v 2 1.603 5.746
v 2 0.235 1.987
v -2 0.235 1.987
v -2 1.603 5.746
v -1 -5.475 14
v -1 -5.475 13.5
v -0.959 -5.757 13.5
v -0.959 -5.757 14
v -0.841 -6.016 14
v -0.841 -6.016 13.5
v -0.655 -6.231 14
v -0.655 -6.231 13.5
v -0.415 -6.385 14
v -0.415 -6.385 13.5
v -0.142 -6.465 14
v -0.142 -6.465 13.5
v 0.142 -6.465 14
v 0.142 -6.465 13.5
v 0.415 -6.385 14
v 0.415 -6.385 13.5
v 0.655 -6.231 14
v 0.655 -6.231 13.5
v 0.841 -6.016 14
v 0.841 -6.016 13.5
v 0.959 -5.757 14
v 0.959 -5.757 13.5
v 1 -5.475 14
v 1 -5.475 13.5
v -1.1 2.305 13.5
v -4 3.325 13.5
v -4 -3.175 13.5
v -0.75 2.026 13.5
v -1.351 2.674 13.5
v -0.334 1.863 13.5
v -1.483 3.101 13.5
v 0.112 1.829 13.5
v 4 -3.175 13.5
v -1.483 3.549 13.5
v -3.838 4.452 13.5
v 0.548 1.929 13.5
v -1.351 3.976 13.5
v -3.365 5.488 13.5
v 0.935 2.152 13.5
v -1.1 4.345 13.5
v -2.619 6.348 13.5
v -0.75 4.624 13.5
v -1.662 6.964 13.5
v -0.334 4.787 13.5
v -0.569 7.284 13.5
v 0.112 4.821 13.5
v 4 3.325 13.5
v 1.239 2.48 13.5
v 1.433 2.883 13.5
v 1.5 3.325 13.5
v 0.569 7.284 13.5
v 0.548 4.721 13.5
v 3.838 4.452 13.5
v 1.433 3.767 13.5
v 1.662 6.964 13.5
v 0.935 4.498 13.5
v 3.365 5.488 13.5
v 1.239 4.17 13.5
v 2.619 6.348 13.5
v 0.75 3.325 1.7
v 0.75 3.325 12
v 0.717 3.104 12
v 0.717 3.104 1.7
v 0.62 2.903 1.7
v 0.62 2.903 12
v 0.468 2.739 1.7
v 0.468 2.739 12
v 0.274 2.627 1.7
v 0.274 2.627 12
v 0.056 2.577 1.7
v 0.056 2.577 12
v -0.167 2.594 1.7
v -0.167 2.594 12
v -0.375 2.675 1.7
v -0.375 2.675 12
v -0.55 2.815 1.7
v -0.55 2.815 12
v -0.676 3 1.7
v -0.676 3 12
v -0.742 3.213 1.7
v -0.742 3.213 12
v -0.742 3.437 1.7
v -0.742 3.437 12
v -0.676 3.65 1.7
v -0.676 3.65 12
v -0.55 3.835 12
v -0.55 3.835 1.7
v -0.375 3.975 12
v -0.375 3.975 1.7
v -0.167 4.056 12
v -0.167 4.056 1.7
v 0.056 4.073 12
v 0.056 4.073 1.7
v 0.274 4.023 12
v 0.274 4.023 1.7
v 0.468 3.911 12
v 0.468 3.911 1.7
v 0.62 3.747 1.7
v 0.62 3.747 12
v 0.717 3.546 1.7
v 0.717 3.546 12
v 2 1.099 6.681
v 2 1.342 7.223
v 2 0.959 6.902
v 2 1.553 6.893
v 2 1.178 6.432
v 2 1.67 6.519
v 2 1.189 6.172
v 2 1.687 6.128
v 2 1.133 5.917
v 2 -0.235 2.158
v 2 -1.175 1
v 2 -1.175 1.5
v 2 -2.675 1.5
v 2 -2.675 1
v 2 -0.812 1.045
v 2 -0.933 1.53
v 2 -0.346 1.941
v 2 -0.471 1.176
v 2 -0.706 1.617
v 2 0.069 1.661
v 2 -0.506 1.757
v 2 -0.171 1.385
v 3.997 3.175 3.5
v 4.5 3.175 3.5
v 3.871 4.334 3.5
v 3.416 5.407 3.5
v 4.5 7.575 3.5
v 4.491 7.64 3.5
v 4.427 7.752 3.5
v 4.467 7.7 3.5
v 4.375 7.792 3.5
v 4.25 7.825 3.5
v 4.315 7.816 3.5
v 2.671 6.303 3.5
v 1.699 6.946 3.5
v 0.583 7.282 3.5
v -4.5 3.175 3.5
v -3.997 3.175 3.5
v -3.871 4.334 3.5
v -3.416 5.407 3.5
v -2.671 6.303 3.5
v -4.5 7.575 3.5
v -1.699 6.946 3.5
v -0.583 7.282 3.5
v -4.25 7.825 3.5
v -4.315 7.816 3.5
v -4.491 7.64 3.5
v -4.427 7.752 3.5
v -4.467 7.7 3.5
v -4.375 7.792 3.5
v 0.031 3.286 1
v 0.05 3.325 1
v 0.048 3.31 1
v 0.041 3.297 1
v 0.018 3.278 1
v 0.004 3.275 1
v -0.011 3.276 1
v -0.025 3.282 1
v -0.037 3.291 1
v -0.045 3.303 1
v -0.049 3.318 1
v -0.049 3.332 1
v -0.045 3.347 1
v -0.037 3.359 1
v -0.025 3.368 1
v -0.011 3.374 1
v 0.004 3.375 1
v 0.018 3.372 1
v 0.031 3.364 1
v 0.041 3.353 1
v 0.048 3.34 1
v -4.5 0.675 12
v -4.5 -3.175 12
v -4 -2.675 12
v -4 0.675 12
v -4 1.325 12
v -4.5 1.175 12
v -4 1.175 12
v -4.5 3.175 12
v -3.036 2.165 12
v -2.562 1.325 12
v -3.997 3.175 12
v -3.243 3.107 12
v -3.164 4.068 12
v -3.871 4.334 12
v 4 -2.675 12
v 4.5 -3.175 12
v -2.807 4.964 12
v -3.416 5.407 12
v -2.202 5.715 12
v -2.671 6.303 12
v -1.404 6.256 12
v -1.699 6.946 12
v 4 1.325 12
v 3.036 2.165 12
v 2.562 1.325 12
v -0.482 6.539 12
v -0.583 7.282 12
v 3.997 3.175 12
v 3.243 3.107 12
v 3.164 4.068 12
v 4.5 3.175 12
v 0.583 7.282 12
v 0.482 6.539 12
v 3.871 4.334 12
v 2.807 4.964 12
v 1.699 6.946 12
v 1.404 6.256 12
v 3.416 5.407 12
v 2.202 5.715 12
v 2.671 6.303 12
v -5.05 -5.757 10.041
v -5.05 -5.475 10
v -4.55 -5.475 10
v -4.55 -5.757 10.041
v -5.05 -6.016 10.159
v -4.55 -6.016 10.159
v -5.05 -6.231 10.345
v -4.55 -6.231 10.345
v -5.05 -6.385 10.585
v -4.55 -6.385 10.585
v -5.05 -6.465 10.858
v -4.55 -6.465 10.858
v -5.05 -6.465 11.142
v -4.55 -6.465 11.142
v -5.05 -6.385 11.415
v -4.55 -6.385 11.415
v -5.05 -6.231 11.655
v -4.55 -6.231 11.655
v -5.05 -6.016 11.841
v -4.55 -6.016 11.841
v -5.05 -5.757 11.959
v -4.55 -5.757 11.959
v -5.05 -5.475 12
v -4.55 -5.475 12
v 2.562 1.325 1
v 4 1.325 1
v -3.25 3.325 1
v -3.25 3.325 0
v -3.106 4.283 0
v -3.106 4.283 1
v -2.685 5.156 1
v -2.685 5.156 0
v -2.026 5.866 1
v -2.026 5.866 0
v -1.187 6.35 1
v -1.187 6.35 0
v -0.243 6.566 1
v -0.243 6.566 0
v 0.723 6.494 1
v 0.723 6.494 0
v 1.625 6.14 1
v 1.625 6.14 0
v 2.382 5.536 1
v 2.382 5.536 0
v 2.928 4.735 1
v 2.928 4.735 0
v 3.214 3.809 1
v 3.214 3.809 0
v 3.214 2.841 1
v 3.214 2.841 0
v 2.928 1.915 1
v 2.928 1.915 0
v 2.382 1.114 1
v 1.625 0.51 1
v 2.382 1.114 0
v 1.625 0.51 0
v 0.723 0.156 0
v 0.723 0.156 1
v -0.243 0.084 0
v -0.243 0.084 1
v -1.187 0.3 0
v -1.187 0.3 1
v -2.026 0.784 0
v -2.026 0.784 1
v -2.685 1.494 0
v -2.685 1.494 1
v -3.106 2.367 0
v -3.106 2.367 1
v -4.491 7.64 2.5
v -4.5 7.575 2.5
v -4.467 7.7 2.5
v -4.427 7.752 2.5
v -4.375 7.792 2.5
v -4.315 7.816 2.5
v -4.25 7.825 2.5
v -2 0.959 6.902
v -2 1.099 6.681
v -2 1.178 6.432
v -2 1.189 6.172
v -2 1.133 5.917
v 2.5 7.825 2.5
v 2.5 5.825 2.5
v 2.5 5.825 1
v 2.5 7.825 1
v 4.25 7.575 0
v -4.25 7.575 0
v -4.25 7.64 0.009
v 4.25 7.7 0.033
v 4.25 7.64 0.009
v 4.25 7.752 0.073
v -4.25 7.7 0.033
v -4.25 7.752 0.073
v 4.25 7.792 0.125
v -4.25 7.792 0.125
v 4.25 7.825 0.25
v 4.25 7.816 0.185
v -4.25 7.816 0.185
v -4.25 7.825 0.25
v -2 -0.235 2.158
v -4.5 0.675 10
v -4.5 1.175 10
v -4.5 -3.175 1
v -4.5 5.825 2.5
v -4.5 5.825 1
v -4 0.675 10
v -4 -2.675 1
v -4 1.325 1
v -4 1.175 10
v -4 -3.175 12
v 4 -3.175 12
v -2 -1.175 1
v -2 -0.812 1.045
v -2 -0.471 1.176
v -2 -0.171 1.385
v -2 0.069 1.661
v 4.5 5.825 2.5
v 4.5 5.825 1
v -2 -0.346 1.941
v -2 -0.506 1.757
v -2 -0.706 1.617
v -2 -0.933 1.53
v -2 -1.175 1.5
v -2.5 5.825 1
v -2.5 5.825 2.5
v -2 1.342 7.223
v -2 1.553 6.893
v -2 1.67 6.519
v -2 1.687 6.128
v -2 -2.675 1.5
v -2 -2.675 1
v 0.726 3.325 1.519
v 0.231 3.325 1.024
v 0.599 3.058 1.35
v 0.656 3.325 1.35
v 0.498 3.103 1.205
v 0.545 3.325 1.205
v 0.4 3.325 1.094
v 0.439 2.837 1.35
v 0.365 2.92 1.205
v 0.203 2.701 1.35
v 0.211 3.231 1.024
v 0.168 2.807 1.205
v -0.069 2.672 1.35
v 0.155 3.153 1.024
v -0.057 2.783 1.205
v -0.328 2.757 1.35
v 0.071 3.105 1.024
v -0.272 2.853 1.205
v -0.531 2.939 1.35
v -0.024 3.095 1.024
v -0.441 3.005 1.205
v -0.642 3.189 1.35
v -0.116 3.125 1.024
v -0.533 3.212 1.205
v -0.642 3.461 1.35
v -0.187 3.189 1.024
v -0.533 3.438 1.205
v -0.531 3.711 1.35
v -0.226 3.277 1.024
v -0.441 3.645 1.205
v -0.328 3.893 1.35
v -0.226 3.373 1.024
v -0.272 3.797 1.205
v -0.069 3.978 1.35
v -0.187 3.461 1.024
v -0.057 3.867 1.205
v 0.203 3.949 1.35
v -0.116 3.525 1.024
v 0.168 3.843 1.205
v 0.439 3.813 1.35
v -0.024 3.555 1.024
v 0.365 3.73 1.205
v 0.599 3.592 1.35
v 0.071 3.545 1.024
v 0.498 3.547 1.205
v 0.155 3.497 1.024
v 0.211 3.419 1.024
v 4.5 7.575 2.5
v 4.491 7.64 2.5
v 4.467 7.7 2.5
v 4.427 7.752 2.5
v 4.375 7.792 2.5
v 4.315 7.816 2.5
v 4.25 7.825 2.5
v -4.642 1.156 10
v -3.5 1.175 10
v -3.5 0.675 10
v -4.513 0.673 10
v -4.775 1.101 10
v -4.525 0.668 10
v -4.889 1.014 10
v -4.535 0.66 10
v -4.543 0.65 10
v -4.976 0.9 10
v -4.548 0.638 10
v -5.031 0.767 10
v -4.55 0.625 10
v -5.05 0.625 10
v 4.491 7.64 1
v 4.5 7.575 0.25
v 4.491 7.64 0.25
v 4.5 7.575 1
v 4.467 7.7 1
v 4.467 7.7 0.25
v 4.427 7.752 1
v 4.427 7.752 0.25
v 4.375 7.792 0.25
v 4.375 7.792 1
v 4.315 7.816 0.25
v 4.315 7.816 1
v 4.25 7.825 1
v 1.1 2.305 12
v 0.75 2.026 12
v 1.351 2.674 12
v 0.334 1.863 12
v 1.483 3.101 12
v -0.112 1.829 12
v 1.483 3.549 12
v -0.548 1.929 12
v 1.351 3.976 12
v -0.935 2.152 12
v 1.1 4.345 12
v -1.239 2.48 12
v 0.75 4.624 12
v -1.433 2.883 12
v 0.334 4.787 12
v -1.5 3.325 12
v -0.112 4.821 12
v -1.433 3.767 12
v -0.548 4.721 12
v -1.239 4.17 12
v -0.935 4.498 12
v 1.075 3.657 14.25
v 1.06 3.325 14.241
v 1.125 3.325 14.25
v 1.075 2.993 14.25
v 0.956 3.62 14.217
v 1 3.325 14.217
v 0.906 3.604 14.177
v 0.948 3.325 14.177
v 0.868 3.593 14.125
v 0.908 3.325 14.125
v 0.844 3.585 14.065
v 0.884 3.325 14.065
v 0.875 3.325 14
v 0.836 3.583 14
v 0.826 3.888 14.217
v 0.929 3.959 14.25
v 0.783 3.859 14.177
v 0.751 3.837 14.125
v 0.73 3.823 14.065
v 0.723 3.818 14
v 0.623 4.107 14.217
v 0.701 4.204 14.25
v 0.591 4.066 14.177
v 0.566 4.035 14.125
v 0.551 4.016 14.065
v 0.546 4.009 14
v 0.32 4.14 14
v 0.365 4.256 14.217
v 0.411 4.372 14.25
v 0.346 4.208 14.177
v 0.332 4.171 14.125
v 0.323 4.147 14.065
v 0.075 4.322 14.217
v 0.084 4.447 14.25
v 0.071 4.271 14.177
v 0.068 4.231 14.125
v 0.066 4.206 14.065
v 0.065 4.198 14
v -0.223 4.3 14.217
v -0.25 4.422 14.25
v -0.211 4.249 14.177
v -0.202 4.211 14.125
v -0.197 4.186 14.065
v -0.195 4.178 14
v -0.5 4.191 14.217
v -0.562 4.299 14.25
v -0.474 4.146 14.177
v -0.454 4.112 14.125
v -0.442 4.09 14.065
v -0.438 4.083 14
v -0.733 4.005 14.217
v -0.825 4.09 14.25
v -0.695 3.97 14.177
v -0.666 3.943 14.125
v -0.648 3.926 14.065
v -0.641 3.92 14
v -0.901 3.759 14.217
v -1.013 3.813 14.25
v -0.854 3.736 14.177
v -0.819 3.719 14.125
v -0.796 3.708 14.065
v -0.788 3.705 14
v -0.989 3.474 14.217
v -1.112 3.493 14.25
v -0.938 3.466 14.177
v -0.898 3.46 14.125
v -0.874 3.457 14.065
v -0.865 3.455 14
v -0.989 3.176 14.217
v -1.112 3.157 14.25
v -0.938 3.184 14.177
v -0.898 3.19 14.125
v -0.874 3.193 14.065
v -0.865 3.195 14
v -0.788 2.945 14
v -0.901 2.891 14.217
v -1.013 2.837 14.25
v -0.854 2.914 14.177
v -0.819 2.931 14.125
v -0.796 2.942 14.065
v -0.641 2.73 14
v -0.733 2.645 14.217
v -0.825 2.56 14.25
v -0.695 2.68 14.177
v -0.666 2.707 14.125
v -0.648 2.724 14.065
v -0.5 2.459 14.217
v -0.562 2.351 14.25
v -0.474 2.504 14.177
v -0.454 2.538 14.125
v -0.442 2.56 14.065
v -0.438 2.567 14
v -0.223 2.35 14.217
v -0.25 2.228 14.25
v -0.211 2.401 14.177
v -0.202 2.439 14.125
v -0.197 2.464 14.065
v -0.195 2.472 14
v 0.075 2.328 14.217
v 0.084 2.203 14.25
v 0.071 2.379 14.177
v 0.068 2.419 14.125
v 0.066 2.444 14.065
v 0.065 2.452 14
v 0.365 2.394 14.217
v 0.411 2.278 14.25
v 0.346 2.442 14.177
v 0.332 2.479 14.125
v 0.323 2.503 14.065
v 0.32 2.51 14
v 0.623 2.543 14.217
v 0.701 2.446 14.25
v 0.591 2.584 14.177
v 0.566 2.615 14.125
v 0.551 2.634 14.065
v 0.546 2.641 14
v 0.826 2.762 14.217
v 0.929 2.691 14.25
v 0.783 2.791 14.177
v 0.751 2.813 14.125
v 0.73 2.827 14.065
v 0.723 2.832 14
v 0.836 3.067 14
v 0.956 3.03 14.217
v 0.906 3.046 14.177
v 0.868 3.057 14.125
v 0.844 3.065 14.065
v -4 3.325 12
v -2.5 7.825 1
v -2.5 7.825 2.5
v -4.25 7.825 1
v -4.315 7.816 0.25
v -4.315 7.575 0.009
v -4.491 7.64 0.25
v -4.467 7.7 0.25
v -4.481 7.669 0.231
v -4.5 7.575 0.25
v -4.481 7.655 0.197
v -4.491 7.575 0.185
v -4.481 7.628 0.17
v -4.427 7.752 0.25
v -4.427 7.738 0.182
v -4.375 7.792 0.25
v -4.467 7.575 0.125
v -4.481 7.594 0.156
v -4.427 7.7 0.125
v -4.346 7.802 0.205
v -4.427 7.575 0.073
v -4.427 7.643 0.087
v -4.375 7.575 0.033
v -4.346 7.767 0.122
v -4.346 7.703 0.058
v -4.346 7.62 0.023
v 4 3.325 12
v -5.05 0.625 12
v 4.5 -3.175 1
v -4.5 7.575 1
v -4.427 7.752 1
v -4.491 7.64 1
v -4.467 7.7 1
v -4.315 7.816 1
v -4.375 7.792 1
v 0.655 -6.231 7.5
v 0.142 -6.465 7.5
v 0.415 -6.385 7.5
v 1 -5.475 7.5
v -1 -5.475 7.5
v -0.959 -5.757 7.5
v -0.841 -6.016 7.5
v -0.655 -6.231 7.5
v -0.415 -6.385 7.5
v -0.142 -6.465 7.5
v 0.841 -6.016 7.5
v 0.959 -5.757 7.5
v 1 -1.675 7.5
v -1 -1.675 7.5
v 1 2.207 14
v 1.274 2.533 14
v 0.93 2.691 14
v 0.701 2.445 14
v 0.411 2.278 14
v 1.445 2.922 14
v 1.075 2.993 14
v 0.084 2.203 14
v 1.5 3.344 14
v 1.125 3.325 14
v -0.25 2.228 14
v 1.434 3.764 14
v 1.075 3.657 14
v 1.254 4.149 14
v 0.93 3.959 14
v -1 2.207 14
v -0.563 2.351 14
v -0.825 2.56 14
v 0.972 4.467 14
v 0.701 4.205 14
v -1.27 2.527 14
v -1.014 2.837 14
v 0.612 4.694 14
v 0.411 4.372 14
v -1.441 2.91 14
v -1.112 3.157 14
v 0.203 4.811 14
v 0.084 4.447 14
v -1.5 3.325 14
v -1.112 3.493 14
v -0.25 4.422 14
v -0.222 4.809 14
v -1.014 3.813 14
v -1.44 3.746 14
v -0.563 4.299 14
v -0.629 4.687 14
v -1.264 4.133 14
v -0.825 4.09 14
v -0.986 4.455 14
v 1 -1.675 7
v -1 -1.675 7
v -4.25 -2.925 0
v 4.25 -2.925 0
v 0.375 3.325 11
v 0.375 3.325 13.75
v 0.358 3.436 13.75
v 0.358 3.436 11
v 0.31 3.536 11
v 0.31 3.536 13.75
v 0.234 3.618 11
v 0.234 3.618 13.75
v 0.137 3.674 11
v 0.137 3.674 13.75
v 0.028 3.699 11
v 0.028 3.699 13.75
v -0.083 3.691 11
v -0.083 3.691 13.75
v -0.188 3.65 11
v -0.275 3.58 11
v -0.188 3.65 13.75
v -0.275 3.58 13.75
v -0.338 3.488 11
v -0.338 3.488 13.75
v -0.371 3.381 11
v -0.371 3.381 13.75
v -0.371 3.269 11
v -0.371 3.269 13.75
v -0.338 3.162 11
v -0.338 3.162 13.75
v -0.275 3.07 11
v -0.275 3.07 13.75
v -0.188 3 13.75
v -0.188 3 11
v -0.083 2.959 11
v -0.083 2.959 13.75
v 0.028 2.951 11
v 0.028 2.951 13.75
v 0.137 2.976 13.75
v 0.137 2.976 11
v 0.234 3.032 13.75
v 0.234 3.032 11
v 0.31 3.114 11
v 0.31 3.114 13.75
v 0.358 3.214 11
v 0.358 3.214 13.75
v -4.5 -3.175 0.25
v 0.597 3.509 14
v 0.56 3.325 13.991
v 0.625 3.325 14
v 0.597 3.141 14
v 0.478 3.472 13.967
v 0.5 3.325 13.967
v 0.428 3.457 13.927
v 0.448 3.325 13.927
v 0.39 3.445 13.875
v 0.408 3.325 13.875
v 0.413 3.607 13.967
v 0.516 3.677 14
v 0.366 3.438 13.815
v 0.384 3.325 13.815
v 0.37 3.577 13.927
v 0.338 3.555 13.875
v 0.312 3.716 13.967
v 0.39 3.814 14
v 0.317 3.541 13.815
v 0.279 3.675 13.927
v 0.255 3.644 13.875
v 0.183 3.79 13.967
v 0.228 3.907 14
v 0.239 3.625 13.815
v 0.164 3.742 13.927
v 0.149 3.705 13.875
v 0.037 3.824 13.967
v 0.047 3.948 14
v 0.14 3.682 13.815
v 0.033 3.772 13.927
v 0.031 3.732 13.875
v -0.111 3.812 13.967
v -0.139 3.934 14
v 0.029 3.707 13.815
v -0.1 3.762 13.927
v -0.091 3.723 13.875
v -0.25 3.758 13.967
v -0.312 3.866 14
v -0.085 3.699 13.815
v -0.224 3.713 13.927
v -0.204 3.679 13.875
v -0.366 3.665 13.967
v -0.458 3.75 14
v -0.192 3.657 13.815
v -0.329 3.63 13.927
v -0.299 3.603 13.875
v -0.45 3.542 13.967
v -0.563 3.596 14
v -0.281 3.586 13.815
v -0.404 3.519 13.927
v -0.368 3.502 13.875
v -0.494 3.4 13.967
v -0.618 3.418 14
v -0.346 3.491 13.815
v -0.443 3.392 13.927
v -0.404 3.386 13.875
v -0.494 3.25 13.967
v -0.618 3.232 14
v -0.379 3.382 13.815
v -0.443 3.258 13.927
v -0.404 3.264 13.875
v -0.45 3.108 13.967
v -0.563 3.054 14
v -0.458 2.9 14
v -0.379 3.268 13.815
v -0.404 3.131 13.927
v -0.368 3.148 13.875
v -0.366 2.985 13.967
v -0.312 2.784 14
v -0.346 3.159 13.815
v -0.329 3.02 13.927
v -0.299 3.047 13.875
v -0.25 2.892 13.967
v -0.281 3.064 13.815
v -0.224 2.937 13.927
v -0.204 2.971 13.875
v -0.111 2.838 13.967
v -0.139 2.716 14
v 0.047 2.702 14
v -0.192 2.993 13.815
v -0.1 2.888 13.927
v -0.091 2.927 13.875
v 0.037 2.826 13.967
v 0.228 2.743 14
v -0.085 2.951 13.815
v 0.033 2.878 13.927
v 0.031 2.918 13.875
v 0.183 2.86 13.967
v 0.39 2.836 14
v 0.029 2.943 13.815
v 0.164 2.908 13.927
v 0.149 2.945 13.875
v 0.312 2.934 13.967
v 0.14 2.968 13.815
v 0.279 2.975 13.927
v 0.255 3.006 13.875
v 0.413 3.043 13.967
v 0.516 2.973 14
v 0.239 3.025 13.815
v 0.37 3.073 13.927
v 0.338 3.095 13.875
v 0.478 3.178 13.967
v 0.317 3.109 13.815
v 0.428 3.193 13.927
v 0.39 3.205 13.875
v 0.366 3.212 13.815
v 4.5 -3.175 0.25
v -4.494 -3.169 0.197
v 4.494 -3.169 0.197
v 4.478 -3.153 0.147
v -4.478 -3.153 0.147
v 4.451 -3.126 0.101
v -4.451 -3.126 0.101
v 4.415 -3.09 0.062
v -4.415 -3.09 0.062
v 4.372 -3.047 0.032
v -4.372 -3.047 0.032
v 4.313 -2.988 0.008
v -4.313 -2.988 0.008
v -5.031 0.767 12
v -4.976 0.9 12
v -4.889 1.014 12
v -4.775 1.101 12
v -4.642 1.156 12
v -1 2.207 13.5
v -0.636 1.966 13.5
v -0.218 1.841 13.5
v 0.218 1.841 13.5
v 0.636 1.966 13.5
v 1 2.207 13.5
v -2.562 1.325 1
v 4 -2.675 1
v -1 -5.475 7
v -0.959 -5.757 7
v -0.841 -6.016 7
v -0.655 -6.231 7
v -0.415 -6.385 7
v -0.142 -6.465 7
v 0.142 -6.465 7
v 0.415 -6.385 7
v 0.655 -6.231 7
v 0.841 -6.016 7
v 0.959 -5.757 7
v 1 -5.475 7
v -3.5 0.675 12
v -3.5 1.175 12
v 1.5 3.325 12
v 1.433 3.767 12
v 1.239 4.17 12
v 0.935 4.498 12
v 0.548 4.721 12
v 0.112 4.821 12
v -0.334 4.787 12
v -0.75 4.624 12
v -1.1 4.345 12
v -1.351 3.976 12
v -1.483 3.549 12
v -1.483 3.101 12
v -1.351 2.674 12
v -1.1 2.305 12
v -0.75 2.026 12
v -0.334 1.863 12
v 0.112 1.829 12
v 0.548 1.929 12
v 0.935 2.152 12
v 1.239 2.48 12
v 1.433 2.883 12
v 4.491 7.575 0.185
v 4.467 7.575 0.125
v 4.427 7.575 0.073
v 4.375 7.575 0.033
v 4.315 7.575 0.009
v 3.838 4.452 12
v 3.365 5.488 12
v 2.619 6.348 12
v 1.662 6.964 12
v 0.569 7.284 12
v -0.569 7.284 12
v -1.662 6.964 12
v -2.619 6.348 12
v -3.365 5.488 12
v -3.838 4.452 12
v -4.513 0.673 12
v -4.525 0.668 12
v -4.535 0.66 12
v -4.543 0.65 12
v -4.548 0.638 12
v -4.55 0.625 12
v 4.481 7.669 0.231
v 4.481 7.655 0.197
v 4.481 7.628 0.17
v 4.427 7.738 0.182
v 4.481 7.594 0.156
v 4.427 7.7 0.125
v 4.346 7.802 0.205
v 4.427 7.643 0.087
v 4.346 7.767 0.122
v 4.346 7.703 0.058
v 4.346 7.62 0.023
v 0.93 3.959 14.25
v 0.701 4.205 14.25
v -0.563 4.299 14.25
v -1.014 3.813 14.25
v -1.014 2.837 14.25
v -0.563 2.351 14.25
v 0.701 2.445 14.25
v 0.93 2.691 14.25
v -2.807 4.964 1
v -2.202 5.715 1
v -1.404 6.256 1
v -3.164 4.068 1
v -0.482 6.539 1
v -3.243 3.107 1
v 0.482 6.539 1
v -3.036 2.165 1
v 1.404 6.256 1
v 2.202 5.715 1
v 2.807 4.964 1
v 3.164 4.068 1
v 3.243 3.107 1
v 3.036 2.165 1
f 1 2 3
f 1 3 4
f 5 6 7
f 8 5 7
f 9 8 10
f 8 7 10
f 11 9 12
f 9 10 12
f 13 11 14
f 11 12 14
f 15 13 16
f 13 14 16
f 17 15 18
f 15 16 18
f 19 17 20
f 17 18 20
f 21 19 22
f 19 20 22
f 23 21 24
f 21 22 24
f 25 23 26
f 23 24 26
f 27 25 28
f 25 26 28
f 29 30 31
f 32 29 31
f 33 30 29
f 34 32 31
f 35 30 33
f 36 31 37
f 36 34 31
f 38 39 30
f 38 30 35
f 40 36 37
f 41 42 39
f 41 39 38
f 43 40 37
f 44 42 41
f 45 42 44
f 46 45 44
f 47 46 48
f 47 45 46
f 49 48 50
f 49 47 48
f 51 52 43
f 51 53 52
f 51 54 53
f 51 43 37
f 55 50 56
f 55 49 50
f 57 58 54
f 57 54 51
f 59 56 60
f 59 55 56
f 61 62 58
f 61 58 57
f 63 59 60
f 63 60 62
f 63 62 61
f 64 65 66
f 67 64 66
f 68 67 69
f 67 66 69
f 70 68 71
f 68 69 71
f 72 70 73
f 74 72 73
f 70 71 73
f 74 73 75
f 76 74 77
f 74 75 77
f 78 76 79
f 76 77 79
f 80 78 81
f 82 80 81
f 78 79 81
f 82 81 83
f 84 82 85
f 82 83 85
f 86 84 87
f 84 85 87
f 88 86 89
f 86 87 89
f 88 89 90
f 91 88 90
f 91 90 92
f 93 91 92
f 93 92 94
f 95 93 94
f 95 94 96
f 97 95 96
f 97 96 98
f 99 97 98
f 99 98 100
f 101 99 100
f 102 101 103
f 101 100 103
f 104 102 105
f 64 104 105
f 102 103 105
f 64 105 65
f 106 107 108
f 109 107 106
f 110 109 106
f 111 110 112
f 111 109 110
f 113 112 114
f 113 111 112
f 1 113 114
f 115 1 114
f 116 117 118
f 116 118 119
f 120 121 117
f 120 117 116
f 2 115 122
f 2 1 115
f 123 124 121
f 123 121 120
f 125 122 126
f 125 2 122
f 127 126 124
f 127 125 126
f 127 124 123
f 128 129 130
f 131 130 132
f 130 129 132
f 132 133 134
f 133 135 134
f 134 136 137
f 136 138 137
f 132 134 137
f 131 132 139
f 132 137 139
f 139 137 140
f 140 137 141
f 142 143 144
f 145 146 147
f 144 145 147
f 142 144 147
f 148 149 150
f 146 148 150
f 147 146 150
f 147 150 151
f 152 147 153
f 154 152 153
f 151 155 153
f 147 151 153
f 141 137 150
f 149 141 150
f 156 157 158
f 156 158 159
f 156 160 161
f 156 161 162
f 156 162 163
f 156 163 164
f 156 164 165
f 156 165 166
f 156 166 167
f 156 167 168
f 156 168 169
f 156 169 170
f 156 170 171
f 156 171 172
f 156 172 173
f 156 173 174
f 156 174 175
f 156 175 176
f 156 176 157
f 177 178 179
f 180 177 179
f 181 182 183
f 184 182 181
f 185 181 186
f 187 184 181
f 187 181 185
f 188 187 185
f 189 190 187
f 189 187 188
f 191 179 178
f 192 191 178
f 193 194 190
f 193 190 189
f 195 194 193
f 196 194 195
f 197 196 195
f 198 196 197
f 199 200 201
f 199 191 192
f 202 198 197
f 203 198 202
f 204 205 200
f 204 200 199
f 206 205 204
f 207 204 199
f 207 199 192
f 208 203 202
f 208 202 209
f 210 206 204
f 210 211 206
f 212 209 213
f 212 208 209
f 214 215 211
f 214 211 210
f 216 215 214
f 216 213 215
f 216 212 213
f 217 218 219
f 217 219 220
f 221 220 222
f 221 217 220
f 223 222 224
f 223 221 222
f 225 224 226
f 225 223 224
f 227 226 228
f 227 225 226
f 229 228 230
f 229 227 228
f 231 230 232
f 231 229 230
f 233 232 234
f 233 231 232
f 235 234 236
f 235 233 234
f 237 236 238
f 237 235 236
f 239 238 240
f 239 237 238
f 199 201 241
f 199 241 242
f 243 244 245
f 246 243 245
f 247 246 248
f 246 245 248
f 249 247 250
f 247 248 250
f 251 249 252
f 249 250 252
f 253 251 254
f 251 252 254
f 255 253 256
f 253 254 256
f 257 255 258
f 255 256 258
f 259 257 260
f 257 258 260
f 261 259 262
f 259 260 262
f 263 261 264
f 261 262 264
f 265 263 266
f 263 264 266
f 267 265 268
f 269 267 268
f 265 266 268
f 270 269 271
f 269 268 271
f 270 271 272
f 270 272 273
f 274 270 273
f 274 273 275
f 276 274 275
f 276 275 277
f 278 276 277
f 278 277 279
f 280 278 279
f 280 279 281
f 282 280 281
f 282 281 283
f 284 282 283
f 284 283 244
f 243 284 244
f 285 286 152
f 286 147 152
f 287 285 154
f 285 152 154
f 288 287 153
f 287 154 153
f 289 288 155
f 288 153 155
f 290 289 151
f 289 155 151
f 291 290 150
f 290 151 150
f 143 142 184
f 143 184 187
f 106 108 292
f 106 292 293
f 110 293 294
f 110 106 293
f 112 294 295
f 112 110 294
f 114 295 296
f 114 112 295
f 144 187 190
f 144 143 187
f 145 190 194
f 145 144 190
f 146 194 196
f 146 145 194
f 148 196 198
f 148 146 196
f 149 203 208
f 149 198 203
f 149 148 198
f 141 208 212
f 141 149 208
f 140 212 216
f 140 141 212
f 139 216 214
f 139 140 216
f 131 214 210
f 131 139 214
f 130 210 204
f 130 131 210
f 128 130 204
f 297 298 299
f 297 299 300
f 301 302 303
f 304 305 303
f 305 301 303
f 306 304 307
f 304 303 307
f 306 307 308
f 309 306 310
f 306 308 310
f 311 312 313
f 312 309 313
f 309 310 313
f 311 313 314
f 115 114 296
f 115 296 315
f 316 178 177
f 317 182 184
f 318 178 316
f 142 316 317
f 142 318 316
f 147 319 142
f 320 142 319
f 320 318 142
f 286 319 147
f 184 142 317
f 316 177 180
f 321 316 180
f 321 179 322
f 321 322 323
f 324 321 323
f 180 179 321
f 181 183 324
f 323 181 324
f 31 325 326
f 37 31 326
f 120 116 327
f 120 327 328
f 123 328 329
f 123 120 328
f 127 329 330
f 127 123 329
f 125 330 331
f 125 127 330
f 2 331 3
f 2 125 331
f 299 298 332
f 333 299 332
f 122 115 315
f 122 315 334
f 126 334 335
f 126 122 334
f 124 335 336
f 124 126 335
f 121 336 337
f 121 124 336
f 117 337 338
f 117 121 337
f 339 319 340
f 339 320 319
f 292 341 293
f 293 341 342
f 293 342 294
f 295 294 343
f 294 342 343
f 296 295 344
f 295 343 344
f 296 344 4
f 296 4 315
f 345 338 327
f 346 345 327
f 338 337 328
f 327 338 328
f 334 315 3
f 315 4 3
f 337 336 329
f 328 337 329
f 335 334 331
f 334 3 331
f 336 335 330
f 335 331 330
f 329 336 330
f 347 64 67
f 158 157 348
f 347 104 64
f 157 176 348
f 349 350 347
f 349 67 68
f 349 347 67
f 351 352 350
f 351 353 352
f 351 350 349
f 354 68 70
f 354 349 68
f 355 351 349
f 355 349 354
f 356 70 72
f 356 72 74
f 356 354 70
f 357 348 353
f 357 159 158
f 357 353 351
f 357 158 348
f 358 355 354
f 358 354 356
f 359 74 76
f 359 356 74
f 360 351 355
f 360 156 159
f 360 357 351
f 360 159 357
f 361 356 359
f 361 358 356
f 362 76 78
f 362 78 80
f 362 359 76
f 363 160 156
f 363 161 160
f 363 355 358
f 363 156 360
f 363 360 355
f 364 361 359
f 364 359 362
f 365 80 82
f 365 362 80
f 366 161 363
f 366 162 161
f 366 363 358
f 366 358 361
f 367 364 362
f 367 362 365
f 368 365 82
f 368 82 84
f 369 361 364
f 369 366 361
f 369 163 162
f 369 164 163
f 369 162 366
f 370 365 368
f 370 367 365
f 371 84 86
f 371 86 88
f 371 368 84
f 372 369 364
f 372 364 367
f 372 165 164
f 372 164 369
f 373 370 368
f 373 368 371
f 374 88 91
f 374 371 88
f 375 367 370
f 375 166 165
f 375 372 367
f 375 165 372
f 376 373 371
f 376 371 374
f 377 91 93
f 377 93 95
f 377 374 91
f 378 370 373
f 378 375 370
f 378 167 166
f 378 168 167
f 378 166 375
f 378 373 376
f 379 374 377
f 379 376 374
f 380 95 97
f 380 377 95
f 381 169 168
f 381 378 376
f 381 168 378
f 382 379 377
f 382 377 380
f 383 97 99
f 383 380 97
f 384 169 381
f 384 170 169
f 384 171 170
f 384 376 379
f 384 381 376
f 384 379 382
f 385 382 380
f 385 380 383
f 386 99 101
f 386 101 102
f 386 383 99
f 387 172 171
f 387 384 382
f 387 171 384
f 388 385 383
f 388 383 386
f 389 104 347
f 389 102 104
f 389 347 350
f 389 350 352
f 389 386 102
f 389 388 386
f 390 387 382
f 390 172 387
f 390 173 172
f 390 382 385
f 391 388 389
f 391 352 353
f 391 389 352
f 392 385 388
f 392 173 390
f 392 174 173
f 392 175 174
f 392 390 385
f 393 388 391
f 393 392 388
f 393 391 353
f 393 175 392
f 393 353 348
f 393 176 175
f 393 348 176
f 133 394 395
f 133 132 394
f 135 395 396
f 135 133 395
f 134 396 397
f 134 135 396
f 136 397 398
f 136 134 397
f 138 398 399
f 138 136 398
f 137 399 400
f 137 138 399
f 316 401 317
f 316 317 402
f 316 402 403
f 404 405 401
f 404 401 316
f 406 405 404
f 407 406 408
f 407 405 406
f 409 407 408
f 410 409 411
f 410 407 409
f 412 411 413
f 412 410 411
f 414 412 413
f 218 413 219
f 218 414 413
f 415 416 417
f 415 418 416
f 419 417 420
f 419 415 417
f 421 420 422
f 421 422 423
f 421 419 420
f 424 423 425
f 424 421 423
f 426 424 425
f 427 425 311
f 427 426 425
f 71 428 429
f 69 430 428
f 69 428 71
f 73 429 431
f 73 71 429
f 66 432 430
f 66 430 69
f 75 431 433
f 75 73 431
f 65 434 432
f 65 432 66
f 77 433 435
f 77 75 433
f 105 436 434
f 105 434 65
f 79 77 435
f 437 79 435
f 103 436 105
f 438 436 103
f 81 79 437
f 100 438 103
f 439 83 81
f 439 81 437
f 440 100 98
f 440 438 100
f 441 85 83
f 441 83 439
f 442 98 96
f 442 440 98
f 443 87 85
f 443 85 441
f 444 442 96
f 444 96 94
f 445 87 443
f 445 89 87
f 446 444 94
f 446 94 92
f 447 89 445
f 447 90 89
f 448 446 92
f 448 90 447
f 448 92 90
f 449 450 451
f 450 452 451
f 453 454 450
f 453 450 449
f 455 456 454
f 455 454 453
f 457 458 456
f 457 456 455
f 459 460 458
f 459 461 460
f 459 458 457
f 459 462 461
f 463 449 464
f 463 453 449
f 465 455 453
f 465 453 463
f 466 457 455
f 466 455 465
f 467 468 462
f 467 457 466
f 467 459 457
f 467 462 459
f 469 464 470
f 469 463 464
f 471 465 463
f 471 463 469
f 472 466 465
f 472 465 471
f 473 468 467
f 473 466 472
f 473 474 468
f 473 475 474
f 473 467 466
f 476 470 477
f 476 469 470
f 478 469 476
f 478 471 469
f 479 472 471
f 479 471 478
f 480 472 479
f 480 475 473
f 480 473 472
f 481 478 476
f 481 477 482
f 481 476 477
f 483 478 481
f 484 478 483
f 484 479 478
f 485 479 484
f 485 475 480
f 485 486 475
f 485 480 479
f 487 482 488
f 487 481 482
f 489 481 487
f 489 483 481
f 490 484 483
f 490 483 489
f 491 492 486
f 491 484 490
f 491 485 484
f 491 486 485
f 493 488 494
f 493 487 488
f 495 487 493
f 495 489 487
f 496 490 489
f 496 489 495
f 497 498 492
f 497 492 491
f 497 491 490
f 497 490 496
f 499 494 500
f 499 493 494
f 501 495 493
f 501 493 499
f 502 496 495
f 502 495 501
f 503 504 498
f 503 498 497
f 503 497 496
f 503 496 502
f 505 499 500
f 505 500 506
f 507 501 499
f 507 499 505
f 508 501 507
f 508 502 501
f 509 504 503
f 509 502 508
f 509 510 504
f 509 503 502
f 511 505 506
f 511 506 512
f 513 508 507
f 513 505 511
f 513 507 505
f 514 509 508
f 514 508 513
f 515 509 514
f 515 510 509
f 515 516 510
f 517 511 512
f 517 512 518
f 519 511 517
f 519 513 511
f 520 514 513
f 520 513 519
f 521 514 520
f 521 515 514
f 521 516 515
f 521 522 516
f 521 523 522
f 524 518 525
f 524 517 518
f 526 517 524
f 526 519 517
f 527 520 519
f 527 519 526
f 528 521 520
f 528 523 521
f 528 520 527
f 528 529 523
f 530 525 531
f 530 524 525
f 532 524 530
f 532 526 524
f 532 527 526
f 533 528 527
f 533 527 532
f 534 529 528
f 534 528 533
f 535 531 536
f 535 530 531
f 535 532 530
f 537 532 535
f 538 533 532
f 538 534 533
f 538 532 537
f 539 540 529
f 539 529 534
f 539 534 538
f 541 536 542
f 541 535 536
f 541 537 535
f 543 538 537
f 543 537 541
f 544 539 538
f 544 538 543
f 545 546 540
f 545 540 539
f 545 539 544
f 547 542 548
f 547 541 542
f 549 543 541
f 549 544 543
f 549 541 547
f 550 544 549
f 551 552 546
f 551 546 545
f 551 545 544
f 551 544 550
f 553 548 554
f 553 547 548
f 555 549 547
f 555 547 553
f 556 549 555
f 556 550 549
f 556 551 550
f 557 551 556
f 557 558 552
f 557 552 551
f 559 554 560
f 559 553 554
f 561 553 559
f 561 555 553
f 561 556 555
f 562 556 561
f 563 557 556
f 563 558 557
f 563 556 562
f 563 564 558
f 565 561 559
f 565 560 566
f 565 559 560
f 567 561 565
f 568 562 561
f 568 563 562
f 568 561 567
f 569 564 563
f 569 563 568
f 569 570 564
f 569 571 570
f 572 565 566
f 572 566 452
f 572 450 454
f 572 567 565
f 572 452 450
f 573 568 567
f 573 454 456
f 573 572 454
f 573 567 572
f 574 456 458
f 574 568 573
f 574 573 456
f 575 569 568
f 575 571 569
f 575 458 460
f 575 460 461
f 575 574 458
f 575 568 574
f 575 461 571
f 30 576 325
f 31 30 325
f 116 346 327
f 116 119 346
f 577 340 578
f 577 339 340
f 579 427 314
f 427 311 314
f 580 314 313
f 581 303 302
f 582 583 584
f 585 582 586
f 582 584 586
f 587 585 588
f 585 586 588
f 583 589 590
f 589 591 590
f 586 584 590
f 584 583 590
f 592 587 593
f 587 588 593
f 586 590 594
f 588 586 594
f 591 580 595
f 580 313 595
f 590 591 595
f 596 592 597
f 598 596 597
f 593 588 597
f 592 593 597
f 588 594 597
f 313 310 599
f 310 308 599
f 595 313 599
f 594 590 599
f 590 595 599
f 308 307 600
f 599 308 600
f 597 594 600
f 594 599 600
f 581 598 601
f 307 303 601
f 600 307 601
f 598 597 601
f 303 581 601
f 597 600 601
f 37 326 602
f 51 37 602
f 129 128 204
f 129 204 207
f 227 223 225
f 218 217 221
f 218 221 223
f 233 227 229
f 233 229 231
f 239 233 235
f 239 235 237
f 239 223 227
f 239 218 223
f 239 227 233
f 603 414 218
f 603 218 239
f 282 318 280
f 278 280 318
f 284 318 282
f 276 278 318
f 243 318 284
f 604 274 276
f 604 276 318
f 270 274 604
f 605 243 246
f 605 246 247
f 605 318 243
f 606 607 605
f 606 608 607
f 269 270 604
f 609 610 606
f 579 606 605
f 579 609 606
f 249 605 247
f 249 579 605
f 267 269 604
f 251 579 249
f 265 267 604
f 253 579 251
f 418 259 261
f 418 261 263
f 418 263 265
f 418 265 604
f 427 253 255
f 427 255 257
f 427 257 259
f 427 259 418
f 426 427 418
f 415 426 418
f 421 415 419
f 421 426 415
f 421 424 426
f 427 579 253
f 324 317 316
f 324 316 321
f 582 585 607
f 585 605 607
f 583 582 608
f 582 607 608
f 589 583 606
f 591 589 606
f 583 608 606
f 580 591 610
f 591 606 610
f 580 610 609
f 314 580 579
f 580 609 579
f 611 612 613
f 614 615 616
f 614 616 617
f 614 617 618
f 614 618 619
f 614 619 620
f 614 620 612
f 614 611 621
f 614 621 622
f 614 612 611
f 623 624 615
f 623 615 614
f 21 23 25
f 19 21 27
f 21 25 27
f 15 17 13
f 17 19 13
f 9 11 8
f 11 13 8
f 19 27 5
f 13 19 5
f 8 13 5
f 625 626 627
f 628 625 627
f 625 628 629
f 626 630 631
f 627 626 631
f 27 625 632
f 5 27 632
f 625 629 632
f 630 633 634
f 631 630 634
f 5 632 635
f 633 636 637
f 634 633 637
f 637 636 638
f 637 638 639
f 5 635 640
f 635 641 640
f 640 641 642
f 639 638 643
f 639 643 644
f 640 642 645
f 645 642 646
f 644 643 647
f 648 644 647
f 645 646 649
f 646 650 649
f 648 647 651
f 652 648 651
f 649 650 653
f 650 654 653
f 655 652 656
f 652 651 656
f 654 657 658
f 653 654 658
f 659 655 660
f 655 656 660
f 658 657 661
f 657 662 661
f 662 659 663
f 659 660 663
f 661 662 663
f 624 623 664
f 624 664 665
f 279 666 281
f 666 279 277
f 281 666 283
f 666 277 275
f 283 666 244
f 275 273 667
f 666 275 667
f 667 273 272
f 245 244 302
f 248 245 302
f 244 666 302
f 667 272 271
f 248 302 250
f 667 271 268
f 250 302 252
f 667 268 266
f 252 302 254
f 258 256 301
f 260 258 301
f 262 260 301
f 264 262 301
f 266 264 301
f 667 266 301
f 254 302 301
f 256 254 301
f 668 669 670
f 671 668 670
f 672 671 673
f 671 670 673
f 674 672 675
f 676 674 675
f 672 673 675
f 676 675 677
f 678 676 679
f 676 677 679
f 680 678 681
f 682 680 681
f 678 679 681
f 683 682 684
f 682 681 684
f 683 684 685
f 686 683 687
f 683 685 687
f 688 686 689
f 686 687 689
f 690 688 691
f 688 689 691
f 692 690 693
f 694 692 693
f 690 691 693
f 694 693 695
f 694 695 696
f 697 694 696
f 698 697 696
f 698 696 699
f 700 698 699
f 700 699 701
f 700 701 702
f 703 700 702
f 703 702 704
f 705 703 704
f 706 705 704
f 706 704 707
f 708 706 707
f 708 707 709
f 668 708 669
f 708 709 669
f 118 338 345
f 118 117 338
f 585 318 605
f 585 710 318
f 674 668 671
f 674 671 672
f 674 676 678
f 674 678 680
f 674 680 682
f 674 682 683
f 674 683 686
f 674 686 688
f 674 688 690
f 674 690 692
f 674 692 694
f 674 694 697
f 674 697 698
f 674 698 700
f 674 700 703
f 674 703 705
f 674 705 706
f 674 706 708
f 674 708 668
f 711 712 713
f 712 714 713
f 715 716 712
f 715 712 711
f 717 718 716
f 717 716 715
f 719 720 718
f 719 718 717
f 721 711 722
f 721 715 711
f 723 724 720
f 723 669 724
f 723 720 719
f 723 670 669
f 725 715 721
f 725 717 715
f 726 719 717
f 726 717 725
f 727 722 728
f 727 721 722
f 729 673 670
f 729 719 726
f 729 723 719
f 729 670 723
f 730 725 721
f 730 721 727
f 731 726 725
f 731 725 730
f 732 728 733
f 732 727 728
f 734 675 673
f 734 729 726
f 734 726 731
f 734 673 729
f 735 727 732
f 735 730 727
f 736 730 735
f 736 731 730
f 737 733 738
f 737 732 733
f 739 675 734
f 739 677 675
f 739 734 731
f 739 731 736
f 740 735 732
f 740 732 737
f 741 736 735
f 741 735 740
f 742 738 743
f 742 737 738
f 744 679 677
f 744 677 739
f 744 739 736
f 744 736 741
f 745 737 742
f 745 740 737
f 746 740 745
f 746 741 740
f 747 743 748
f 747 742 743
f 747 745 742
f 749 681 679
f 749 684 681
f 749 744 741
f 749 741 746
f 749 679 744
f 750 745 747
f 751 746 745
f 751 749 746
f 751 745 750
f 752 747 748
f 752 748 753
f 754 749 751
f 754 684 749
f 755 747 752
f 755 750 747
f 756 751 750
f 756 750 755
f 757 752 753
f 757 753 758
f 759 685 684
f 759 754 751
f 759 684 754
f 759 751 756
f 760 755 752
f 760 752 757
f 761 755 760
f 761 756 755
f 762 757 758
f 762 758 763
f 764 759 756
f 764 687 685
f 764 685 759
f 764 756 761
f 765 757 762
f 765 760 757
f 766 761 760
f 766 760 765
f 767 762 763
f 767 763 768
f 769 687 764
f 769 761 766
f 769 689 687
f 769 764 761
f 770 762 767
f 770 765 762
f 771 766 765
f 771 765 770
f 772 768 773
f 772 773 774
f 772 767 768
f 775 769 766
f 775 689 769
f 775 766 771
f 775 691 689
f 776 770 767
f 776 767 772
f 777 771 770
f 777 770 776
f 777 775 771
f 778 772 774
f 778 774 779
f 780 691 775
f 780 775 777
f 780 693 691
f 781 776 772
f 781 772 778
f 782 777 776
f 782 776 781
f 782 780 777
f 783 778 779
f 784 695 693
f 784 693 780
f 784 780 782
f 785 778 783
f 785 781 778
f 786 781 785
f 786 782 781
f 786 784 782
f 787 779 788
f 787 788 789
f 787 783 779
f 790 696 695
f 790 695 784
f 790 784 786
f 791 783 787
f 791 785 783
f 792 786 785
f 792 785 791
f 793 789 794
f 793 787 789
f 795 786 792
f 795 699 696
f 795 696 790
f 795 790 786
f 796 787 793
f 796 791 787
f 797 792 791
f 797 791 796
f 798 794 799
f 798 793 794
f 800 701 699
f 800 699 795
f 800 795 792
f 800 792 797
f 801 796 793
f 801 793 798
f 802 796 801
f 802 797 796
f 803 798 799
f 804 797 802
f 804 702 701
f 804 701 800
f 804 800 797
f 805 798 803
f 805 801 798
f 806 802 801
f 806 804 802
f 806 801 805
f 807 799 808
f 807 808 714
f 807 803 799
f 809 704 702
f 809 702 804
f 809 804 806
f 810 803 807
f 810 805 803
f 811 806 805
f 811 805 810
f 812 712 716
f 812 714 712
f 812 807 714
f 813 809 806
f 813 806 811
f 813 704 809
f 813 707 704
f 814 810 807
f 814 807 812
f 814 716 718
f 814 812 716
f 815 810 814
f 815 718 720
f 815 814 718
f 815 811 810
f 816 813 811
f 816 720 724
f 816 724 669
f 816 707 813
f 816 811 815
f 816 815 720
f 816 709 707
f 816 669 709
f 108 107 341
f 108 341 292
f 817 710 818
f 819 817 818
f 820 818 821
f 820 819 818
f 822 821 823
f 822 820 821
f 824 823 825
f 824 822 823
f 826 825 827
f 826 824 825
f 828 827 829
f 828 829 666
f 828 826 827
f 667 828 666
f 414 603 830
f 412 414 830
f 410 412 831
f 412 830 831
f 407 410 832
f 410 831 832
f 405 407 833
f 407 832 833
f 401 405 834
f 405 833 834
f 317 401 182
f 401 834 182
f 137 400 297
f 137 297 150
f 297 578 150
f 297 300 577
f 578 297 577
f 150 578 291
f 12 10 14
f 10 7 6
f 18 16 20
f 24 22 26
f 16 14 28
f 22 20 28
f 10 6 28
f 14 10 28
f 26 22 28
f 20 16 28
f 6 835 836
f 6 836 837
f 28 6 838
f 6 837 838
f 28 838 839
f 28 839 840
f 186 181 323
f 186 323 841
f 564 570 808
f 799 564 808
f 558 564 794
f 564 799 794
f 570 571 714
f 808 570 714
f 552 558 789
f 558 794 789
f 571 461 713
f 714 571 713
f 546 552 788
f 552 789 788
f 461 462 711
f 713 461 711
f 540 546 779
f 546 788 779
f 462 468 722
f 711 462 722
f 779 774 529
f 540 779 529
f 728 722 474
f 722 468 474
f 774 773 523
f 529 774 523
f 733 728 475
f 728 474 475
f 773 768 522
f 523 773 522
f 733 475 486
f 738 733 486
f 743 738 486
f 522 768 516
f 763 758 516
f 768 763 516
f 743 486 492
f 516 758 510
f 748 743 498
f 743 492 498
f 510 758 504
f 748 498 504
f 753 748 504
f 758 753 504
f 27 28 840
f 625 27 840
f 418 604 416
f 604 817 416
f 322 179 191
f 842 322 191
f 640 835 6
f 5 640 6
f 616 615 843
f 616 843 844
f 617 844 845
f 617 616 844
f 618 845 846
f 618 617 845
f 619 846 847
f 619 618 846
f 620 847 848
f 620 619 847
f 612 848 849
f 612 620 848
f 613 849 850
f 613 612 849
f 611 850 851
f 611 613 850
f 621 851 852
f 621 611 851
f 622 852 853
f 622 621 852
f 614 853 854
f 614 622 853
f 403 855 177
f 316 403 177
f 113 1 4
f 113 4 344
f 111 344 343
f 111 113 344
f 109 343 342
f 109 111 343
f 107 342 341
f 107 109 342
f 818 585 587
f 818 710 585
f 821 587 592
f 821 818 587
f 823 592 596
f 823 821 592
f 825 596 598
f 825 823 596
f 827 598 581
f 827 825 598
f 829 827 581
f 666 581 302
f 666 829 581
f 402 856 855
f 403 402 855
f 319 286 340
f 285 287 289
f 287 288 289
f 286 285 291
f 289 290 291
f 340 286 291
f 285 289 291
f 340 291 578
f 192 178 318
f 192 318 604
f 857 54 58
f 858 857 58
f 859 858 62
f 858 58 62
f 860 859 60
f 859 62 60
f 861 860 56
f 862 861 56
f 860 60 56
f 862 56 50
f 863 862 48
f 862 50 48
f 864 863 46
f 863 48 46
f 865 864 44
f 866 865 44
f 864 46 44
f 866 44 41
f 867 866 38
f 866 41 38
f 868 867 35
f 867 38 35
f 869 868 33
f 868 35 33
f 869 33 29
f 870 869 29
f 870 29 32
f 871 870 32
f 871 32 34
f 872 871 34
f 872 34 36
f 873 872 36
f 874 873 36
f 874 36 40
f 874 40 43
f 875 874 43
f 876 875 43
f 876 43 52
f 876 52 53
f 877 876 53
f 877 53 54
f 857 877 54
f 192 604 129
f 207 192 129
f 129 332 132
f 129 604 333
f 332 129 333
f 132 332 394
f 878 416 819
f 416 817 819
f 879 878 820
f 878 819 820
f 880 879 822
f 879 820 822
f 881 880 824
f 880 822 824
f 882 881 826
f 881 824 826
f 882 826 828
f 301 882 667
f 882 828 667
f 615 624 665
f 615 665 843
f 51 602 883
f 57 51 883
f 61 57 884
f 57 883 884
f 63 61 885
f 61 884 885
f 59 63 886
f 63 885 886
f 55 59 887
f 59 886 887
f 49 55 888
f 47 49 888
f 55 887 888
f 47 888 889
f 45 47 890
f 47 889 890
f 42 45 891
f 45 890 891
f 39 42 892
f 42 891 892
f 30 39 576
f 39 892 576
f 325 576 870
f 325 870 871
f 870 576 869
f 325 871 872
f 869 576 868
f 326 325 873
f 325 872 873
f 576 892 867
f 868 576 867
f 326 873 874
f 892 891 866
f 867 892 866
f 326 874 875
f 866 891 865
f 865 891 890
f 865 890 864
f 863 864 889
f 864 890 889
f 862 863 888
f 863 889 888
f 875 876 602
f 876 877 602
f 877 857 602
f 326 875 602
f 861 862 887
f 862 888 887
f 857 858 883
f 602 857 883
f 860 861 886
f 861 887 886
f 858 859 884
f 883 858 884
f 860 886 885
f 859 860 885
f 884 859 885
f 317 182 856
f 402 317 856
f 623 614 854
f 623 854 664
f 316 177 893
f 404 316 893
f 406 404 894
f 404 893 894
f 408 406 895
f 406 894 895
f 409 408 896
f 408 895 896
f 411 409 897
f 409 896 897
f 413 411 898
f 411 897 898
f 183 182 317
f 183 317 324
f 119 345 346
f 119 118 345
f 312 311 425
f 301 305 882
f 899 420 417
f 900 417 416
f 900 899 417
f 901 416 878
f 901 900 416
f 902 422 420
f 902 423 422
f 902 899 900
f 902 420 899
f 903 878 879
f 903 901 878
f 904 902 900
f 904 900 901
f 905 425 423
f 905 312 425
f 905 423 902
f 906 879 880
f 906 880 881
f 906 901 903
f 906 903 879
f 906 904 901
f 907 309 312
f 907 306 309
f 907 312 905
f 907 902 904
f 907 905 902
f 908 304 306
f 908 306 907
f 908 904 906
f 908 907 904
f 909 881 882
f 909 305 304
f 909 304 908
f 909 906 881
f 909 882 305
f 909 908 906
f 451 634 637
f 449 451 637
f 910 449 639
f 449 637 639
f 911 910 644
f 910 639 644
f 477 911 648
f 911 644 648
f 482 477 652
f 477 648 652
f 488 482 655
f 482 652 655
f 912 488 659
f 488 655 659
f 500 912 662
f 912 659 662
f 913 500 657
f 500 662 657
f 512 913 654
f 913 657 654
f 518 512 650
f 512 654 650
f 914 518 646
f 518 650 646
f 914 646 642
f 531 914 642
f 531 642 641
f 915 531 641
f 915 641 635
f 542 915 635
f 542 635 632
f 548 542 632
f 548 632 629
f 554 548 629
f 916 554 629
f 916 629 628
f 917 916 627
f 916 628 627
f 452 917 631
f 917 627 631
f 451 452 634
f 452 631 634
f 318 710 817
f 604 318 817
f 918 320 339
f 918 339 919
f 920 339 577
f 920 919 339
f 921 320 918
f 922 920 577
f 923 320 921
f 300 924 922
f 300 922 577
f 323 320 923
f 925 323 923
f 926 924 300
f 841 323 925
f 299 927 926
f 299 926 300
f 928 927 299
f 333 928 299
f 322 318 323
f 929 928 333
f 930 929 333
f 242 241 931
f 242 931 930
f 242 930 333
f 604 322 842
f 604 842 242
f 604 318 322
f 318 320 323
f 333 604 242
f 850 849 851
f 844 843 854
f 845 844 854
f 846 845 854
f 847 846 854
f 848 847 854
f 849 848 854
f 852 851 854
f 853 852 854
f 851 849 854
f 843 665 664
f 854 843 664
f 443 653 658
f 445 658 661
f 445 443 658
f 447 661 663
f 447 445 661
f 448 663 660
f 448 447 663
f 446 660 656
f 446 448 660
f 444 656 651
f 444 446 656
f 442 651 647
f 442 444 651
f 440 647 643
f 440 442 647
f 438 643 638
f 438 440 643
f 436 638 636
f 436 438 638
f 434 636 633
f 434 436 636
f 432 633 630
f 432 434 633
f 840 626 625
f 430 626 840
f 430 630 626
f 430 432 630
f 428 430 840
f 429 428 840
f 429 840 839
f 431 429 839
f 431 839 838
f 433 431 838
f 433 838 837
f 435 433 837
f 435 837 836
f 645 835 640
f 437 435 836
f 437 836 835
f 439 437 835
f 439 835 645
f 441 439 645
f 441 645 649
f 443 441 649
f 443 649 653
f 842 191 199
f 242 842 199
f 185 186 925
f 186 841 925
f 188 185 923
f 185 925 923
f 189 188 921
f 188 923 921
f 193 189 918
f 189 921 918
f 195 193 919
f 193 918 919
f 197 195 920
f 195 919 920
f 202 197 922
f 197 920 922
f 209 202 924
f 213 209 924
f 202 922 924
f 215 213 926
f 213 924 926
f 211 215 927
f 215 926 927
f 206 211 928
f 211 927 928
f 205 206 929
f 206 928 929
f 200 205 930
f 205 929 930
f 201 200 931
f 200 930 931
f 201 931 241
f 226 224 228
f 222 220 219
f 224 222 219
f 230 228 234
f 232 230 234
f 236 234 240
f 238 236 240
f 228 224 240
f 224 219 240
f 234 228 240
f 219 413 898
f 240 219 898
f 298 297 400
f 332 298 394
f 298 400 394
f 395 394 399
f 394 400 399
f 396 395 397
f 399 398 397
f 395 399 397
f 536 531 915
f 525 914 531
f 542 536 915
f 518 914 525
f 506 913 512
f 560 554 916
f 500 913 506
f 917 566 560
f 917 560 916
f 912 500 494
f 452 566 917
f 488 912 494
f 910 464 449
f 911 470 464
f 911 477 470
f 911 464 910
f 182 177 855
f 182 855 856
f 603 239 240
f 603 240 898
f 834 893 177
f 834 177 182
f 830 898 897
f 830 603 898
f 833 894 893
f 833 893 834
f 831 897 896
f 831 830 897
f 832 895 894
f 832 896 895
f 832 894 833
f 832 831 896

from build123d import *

# Parameters (mm, degrees)
SKETCH1_W              = 9
SKETCH1_H              = 6.35
BOSS_EXTRUDE1_DEPTH    = 12
SKETCH2_W              = 9
SKETCH2_H              = 11
BOSS_EXTRUDE2_DEPTH    = 3.5
SKETCH4_R              = 4
BOSS_EXTRUDE3_DEPTH    = 12
SKETCH5_W              = 2
SKETCH5_H              = 2
CUT_EXTRUDE1_DEPTH     = 0.75
FILLET1_R              = 0.25
CUT_EXTRUDE2_REACH     = 17.016
SKETCH6_R              = 3.25
SKETCH7_W              = 8
SKETCH7_H              = 4
CUT_EXTRUDE3_DEPTH     = 11
BOSS_EXTRUDE5_DEPTH    = 1.5
SPLIT1_SURFACE_1_BACK  = 20.602
SPLIT1_SURFACE_1_DEPTH = 41.204
SPLIT1_SURFACE_2_BACK  = 20.602
SPLIT1_SURFACE_2_DEPTH = 41.204
SKETCH10_R             = 1.5
CUT_EXTRUDE4_DEPTH     = 17.239785251
SKETCH11_R             = 1.5
BOSS_EXTRUDE6_DEPTH    = 2
SKETCH12_R             = 0.75
BOSS_EXTRUDE7_DEPTH    = 11
FILLET2_R              = 0.7
BOSS_EXTRUDE8_DEPTH    = 0.5
SKETCH14_W             = 0.5
SKETCH14_H             = 0.5
CUT_EXTRUDE5_DEPTH     = 2
EXTRUDE_THIN1_DEPTH    = 2
BOSS_EXTRUDE9_DEPTH    = 0.5
BOSS_EXTRUDE10_DEPTH   = 0.5
EXTRUDE_THIN2_DEPTH    = 2
SKETCH21_R             = 1.125
SKETCH21_R_2           = 0.875
EXTRUDE_THIN3_DEPTH    = 0.25
SKETCH22_R             = 0.375
CUT_EXTRUDE6_DEPTH     = 3
FILLET3_R              = 0.25


with BuildPart() as part:
    # Sketch1 → Boss-Extrude1 (new body)
    with BuildSketch(Plane.XY):
        Rectangle(SKETCH1_W, SKETCH1_H)
    extrude(amount=BOSS_EXTRUDE1_DEPTH)

    # Sketch2 → Boss-Extrude2 (add)
    with BuildSketch(Plane(origin=(0, 0, 0), x_dir=(-1, 0, 0), z_dir=(0, 0, -1))):
        with Locations((0, 2.325)):
            Rectangle(SKETCH2_W, SKETCH2_H)
    extrude(amount=-BOSS_EXTRUDE2_DEPTH)

    # Sketch4 → Boss-Extrude3 (add)
    with BuildSketch(Plane(origin=(0, 0, 0), x_dir=(-1, 0, 0), z_dir=(0, 0, -1))):
        with Locations((0, 3.325)):
            Circle(SKETCH4_R)
    extrude(amount=-BOSS_EXTRUDE3_DEPTH)

    # Sketch5 → Cut-Extrude1 (cut, symmetric)
    with BuildSketch(Plane.XY.offset(1.75)):
        with Locations((-3.5, 6.825)):
            Rectangle(SKETCH5_W, SKETCH5_H)
        with Locations((3.5, 6.825)):
            Rectangle(SKETCH5_W, SKETCH5_H)
    extrude(amount=CUT_EXTRUDE1_DEPTH, both=True, mode=Mode.SUBTRACT)

    # Fillet1
    fillet1_edges = [part.edges().sort_by_distance(p)[0] for p in [
        (0, 7.825, 0),
        (-4.5, 7.825, 3),
        (4.5, 7.825, 3),
        (-4.5, 7.825, 0.5),
        (4.5, 7.825, 0.5),
        (4.5, 2.325, 0),
        (0, -3.175, 0),
        (-4.5, 2.325, 0),
    ]]
    fillet(fillet1_edges, radius=FILLET1_R)

    # Sketch6 → Cut-Extrude2 (cut, up to next)
    with BuildSketch(Plane(origin=(0, 0, 0), x_dir=(-1, 0, 0), z_dir=(0, 0, -1)), mode=Mode.PRIVATE) as cut_extrude2_sk1:
        with Locations((0, 3.325)):
            Circle(SKETCH6_R)
    cut_extrude2_tool1 = extrude(cut_extrude2_sk1.sketch, amount=-CUT_EXTRUDE2_REACH, mode=Mode.PRIVATE) & part.part
    add(cut_extrude2_tool1.solids().sort_by_distance((0, 3.325, 0))[0], mode=Mode.SUBTRACT)

    # Sketch7 → Cut-Extrude3 (cut)
    with BuildSketch(Plane.XY.offset(12)):
        with Locations((0, -0.675)):
            Rectangle(SKETCH7_W, SKETCH7_H)
    extrude(amount=-CUT_EXTRUDE3_DEPTH, mode=Mode.SUBTRACT)


with BuildPart() as body_2:
    # Sketch8 → Boss-Extrude5 (new body)
    with BuildSketch(Plane.XY.offset(12)):
        with BuildLine():
            Line((-4, 3.325), (-4, -3.175))
            Line((-4, -3.175), (4, -3.175))
            Line((4, -3.175), (4, 3.325))
            ThreePointArc((4, 3.325), (0, 7.325), (-4, 3.325))
        make_face()
    extrude(amount=BOSS_EXTRUDE5_DEPTH)

    # Sketch10 → Cut-Extrude4 (cut, through all)
    with BuildSketch(Plane.XY.offset(13.5)):
        with Locations((0, 3.325)):
            Circle(SKETCH10_R)
    extrude(amount=-CUT_EXTRUDE4_DEPTH, mode=Mode.SUBTRACT)


with BuildPart() as body_3:
    # Split1: the piece behind the surface
    add(part.part)
    # Split1 surface: a surface, the sketch's curves swept straight by 41.204 mm
    with BuildLine(Plane(origin=(0, 7.825, 0), x_dir=(1, 0, 0), z_dir=(0, 1, 0)).offset(-SPLIT1_SURFACE_1_BACK), mode=Mode.PRIVATE) as split1_surface_1_path:
        Line((-5, -1), (5, -1))
    split1_surface_1 = Shell.extrude(split1_surface_1_path.wire(), (0 * SPLIT1_SURFACE_1_DEPTH, 1 * SPLIT1_SURFACE_1_DEPTH, 0 * SPLIT1_SURFACE_1_DEPTH))
    split(bisect_by=split1_surface_1, keep=Keep.BOTTOM)

    # Sketch14 → Cut-Extrude5 (cut)
    with BuildSketch(Plane.XY.offset(12)):
        with Locations((-4.25, 0.925)):
            Rectangle(SKETCH14_W, SKETCH14_H)
    extrude(amount=-CUT_EXTRUDE5_DEPTH, mode=Mode.SUBTRACT)


with BuildPart() as part_1:
    add(part.part)

    # Split1: split by a surface, the side it looks to stays
    # Split1 surface: a surface, the sketch's curves swept straight by 41.204 mm
    with BuildLine(Plane(origin=(0, 7.825, 0), x_dir=(1, 0, 0), z_dir=(0, 1, 0)).offset(-SPLIT1_SURFACE_2_BACK), mode=Mode.PRIVATE) as split1_surface_2_path:
        Line((-5, -1), (5, -1))
    split1_surface_2 = Shell.extrude(split1_surface_2_path.wire(), (0 * SPLIT1_SURFACE_2_DEPTH, 1 * SPLIT1_SURFACE_2_DEPTH, 0 * SPLIT1_SURFACE_2_DEPTH))
    split(bisect_by=split1_surface_2, keep=Keep.TOP)


with BuildPart() as body_4:
    # Sketch11 → Boss-Extrude6 (new body)
    with BuildSketch(Plane(origin=(0, 0, 12), x_dir=(-1, 0, 0), z_dir=(0, 0, -1))):
        with Locations((0, 3.325)):
            Circle(SKETCH11_R)
    extrude(amount=-BOSS_EXTRUDE6_DEPTH)

    # Sketch12 → Boss-Extrude7 (add)
    with BuildSketch(Plane(origin=(0, 0, 12), x_dir=(-1, 0, 0), z_dir=(0, 0, -1))):
        with Locations(Location((0, 3.325, 0), (0, 0, 180))):
            Circle(SKETCH12_R)
    extrude(amount=BOSS_EXTRUDE7_DEPTH)

    # Fillet2
    fillet2_edges = [body_4.edges().sort_by_distance(p)[0] for p in [
        (-0.75, 3.325, 1),
    ]]
    fillet(fillet2_edges, radius=FILLET2_R)

    # Sketch13 → Boss-Extrude8 (add)
    with BuildSketch(Plane.XY.offset(13.5)):
        with BuildLine():
            Line((-1, 2.206966011), (-1, -5.475))
            ThreePointArc((-1, -5.475), (0, -6.475), (1, -5.475))
            Line((1, -5.475), (1, 2.206966011))
            ThreePointArc((1, 2.206966011), (0, 1.825), (-1, 2.206966011))
        make_face()
    extrude(amount=BOSS_EXTRUDE8_DEPTH)

    # Sketch21 → Extrude-Thin3 (add)
    with BuildSketch(Plane.XY.offset(14)):
        with Locations((0, 3.325)):
            Circle(SKETCH21_R)
        with Locations((0, 3.325)):
            Circle(SKETCH21_R_2, mode=Mode.SUBTRACT)
    extrude(amount=EXTRUDE_THIN3_DEPTH)

    # Sketch22 → Cut-Extrude6 (cut)
    with BuildSketch(Plane.XY.offset(14)):
        with Locations((0, 3.325)):
            Circle(SKETCH22_R)
    extrude(amount=-CUT_EXTRUDE6_DEPTH, mode=Mode.SUBTRACT)

    # Fillet3
    fillet3_edges = [body_4.edges().sort_by_distance(p)[0] for p in [
        (-0.875, 3.325, 14.25),
        (-0.375, 3.325, 14),
    ]]
    fillet(fillet3_edges, radius=FILLET3_R - 0.0001)  # a hair under: the kernel refuses the full size


with BuildPart() as body_5:
    # Sketch15 → Extrude-Thin1 (new body)
    with BuildSketch(Plane.XY.offset(12)):
        with BuildLine():
            Line((-3.5, 0.675), (-4.5, 0.675))
            ThreePointArc((-4.5, 0.675), (-4.535355339, 0.660355339), (-4.55, 0.625))
            Line((-4.55, 0.625), (-4.55, -3.175))
            Line((-4.55, -3.175), (-5.05, -3.175))
            Line((-5.05, -3.175), (-5.05, 0.625))
            ThreePointArc((-5.05, 0.625), (-4.88890873, 1.01390873), (-4.5, 1.175))
            Line((-4.5, 1.175), (-3.5, 1.175))
            Line((-3.5, 1.175), (-3.5, 0.675))
        make_face()
    extrude(amount=-EXTRUDE_THIN1_DEPTH)

    # Sketch16 → Boss-Extrude9 (add)
    with BuildSketch(Plane.ZY.offset(5.05)):
        with BuildLine():
            Line((10, -3.175), (10, -5.475))
            ThreePointArc((10, -5.475), (11, -6.475), (12, -5.475))
            Line((12, -5.475), (12, -3.175))
            Line((12, -3.175), (10, -3.175))
        make_face()
    extrude(amount=-BOSS_EXTRUDE9_DEPTH)


with BuildPart() as body_6:
    # Sketch17 → Boss-Extrude10 (new body)
    with BuildSketch(Plane.XY.offset(7.5)):
        with BuildLine():
            Line((-1, -3.175), (-1, -5.475))
            ThreePointArc((-1, -5.475), (0, -6.475), (1, -5.475))
            Line((1, -5.475), (1, -3.175))
            Line((1, -3.175), (1, -1.675))
            Line((1, -1.675), (-1, -1.675))
            Line((-1, -1.675), (-1, -3.175))
        make_face()
    extrude(amount=-BOSS_EXTRUDE10_DEPTH)


with BuildPart() as body_7:
    # Sketch18 → Extrude-Thin2 (new, symmetric)
    with BuildSketch(Plane(origin=(0, 0, 0), x_dir=(0, 0, -1), z_dir=(1, 0, 0))):
        with BuildLine():
            Line((-1, -2.675), (-1, -1.175))
            ThreePointArc((-1, -1.175), (-1.271271934, -0.314635345), (-1.986969785, 0.234538931))
            Line((-1.986969785, 0.234538931), (-5.745740268, 1.602619504))
            ThreePointArc((-5.745740268, 1.602619504), (-6.51924275, 1.670292203), (-7.222951898, 1.342147238))
            Line((-7.222951898, 1.342147238), (-6.901558093, 0.959125016))
            ThreePointArc((-6.901558093, 0.959125016), (-6.432418661, 1.177888326), (-5.91675034, 1.132773194))
            Line((-5.91675034, 1.132773194), (-2.157979857, -0.235307379))
            ThreePointArc((-2.157979857, -0.235307379), (-1.680847956, -0.601423564), (-1.5, -1.175))
            Line((-1.5, -1.175), (-1.5, -2.675))
            Line((-1.5, -2.675), (-1, -2.675))
        make_face()
    extrude(amount=EXTRUDE_THIN2_DEPTH, both=True)


solid = Compound([body_2.part, body_3.part, part_1.part, body_4.part, body_5.part, body_6.part, body_7.part])
